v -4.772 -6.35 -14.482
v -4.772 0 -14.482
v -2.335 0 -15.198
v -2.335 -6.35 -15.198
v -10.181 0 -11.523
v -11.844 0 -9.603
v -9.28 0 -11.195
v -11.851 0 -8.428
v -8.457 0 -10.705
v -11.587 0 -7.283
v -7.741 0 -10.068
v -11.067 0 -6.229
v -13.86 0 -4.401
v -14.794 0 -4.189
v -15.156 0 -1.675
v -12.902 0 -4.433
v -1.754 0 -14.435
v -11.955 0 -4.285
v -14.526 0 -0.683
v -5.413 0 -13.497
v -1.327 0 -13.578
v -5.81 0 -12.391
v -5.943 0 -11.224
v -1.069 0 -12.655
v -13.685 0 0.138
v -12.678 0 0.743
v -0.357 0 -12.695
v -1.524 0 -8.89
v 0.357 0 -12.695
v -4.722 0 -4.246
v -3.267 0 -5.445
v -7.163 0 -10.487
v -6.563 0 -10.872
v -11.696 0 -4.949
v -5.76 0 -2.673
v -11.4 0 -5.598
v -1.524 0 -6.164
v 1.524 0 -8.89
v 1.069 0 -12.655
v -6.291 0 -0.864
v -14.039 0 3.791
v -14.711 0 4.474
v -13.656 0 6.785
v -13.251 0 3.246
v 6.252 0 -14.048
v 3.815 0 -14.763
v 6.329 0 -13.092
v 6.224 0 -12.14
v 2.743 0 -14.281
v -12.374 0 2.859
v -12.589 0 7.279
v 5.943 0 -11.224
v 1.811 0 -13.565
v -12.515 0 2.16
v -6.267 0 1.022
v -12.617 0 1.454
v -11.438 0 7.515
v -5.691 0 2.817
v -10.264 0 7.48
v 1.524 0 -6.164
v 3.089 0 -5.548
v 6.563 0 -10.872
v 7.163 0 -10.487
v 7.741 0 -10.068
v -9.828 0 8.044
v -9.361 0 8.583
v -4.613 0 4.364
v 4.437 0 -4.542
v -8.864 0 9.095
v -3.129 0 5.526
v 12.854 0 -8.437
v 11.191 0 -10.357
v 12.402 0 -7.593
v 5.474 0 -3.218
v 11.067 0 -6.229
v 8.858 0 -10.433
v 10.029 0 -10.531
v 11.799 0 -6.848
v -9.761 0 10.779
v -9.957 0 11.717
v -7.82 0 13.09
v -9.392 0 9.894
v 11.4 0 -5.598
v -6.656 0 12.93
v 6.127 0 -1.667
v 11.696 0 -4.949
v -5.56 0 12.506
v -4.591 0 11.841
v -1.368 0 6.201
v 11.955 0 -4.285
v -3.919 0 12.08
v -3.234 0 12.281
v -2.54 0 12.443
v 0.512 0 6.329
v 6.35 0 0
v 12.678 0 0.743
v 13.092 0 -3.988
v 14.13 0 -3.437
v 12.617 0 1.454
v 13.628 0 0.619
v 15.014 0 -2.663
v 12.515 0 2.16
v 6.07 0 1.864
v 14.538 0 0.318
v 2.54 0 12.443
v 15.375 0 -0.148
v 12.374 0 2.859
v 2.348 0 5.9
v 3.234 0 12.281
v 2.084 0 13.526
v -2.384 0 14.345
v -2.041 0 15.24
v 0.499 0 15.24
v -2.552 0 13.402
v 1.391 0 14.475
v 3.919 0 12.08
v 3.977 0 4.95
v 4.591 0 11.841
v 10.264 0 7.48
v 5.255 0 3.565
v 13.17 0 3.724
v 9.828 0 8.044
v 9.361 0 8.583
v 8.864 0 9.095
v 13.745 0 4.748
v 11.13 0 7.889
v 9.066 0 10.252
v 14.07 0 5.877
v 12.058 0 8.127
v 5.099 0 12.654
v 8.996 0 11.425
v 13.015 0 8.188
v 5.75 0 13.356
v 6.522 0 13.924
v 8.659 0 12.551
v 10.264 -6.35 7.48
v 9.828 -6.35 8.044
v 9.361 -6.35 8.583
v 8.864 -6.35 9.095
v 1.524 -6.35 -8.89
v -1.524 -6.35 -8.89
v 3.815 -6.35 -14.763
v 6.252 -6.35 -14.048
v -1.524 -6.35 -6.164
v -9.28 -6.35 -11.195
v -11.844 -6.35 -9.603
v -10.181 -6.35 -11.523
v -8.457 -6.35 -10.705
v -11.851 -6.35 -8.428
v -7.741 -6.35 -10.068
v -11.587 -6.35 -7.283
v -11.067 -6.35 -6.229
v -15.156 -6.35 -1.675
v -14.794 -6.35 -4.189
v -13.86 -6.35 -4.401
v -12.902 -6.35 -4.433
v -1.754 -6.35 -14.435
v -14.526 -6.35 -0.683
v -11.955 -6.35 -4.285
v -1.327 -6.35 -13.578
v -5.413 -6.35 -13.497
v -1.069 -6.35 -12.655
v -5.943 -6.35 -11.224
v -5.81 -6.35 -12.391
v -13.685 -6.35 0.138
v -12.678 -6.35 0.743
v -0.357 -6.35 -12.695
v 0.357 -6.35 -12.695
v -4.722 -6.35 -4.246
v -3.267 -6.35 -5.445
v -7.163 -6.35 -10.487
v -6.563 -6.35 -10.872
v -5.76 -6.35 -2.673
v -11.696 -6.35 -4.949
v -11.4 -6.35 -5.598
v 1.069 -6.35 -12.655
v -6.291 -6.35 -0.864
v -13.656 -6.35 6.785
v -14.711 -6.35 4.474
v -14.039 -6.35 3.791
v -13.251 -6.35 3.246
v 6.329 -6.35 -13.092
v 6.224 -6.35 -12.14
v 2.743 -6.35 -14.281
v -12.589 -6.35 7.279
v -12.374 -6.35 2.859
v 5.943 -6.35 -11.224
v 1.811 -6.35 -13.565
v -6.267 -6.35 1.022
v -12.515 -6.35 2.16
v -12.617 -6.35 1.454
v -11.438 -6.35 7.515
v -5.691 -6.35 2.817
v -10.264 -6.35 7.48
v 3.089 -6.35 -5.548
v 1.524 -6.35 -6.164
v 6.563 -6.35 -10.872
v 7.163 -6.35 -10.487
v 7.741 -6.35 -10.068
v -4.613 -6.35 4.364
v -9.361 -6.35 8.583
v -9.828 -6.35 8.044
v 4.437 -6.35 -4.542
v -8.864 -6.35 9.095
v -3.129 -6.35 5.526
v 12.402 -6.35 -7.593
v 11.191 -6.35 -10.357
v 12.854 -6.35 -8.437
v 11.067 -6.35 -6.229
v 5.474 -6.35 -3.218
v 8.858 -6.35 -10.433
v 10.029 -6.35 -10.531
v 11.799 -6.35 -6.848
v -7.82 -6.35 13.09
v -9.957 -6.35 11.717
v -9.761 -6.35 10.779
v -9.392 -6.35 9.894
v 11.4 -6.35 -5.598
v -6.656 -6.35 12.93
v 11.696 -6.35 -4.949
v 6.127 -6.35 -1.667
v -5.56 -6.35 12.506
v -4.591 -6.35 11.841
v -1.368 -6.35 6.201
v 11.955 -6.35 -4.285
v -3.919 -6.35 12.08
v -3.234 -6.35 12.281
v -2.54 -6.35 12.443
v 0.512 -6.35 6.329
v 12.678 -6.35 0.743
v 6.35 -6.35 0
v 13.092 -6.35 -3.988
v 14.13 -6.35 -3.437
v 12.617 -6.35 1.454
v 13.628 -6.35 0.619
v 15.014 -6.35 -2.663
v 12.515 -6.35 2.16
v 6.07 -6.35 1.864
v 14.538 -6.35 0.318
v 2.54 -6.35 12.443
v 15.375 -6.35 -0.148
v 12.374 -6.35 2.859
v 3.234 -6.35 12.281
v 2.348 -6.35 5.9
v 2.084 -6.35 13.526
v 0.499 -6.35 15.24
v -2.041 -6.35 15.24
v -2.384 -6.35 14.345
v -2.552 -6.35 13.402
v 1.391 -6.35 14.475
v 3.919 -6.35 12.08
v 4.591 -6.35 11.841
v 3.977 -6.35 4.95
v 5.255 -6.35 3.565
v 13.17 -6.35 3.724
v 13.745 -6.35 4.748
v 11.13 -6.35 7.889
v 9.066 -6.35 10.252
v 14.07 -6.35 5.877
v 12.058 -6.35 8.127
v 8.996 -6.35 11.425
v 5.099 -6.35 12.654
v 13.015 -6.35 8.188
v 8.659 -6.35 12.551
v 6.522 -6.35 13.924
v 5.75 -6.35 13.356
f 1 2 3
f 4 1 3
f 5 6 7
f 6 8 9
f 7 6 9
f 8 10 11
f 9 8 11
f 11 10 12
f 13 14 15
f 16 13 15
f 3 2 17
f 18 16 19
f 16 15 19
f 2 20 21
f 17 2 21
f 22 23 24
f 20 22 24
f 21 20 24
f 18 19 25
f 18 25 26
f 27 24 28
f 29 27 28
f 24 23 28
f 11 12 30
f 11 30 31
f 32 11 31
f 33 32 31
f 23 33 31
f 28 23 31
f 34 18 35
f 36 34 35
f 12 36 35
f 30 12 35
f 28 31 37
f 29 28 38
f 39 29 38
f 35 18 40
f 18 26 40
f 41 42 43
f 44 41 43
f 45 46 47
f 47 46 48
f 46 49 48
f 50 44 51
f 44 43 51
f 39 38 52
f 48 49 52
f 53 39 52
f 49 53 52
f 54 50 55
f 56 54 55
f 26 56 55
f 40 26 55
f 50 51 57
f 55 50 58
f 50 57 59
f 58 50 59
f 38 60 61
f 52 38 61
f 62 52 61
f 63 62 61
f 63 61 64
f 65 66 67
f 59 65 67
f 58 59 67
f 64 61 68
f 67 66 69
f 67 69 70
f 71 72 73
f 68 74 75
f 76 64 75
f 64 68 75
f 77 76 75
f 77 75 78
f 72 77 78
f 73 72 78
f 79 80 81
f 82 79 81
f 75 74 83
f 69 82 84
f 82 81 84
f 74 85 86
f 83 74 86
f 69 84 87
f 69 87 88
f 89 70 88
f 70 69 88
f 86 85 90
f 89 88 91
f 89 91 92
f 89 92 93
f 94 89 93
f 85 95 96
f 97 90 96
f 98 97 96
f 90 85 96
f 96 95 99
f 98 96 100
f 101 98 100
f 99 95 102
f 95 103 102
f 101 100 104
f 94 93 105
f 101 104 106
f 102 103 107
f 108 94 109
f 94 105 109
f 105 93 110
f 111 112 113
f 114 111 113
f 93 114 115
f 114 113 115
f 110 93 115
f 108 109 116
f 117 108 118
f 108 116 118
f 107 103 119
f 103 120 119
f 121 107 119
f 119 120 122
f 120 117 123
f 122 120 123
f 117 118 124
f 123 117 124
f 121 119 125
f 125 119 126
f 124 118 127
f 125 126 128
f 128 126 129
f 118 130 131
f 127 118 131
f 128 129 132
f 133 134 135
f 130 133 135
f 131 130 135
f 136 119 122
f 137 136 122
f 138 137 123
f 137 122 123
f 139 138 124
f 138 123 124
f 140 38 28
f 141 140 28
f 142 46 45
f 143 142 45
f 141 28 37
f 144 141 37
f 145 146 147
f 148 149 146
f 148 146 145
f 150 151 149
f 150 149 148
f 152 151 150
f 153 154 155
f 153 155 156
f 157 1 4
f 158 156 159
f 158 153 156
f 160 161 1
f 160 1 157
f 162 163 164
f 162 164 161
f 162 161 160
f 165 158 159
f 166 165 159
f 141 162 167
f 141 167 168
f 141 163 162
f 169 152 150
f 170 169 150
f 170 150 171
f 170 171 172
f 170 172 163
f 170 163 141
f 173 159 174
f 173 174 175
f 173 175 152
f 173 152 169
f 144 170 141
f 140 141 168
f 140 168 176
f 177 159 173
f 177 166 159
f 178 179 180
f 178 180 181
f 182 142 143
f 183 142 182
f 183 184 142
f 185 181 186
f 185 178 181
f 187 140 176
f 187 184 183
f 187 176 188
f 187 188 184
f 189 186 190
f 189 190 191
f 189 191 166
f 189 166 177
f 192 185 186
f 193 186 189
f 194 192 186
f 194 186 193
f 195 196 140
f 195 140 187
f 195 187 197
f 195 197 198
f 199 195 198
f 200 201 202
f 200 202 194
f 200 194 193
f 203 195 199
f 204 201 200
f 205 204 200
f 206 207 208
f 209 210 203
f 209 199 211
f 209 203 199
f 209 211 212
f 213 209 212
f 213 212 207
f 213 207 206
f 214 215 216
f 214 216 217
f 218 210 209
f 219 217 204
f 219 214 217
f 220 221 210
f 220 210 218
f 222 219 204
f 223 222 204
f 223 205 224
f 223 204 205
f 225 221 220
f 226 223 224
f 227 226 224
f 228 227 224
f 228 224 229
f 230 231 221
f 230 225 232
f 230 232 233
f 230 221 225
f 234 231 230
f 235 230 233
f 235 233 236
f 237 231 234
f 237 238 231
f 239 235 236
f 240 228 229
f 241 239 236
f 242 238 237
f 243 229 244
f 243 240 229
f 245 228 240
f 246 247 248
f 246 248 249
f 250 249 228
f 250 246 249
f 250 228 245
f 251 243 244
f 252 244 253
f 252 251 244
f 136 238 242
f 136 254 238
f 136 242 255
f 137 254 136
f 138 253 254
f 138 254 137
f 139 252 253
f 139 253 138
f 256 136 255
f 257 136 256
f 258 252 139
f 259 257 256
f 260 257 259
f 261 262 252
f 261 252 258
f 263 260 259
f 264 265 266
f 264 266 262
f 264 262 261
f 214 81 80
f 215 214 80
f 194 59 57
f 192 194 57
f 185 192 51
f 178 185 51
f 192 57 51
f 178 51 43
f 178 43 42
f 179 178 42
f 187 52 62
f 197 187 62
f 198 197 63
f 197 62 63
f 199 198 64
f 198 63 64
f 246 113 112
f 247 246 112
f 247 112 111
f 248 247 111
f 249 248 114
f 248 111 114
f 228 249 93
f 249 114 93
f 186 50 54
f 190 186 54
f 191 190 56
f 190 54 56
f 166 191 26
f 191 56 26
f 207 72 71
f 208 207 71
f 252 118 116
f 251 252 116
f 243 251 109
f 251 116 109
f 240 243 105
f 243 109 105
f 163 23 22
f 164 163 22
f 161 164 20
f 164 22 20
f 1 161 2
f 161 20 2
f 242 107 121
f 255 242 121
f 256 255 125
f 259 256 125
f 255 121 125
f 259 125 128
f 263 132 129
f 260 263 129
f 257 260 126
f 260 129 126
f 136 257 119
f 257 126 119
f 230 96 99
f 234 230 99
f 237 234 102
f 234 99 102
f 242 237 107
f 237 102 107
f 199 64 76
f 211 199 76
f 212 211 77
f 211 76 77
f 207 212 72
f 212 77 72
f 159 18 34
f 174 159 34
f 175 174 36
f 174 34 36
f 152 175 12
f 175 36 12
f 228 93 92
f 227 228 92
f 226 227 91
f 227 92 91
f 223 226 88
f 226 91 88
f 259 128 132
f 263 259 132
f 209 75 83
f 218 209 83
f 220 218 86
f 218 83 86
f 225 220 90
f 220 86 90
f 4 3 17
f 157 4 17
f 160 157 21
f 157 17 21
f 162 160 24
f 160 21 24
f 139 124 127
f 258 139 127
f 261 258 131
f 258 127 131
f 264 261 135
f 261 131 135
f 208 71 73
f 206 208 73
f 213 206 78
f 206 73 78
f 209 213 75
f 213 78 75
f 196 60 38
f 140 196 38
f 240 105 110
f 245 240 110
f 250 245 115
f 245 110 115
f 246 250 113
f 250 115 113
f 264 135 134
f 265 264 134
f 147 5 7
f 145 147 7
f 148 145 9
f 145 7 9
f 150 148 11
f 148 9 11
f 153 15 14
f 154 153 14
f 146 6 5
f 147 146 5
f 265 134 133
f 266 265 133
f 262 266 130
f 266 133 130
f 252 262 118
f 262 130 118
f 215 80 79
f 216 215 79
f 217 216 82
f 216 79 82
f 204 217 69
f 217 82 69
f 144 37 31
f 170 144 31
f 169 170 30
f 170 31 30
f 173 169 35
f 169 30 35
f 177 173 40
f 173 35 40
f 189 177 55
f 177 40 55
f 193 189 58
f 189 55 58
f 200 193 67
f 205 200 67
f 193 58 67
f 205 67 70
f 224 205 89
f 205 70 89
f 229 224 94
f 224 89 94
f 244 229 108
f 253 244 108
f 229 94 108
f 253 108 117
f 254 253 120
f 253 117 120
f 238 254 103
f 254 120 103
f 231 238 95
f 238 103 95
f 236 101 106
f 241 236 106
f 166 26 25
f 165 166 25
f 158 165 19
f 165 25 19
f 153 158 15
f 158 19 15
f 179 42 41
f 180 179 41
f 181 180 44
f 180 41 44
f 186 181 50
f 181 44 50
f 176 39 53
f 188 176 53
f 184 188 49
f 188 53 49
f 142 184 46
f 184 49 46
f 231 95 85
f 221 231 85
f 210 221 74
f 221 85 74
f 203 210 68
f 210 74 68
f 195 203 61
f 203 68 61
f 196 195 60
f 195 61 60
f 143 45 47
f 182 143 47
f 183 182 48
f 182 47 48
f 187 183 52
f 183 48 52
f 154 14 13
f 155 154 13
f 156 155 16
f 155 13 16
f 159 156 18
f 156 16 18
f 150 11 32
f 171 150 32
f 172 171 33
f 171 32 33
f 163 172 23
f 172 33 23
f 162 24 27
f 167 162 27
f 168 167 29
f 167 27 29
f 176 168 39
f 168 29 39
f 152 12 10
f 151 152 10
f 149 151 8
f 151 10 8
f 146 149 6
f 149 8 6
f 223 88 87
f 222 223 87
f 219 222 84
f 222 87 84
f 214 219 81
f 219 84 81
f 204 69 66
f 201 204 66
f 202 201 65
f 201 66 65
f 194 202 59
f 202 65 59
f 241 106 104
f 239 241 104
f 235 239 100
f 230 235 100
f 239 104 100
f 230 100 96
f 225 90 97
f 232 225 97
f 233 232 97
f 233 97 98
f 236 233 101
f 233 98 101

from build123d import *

# Parameters (mm, degrees)
F1_DEPTH = 6.35


with BuildPart() as f1:
    # F0 (on Front) → F1 (new body)
    with BuildSketch(Plane.XZ):
        with BuildLine():
            Line((0.498749, 15.24), (-2.041251, 15.24))
            ThreePointArc((-2.041251, 15.24), (-2.490083, 13.877276), (-2.54, 12.443408))
            ThreePointArc((-2.54, 12.443408), (-3.578003, 12.185561), (-4.59063, 11.841289))
            ThreePointArc((-4.59063, 11.841289), (-6.095514, 12.749414), (-7.819791, 13.090348))
            Line((-7.819791, 13.090348), (-9.956575, 11.71712))
            ThreePointArc((-9.956575, 11.71712), (-9.597413, 10.328067), (-8.864198, 9.094833))
            ThreePointArc((-8.864198, 9.094833), (-9.59802, 8.316731), (-10.263768, 7.479644))
            ThreePointArc((-10.263768, 7.479644), (-12.020726, 7.430005), (-13.655604, 6.784603))
            Line((-13.655604, 6.784603), (-14.710758, 4.474138))
            ThreePointArc((-14.710758, 4.474138), (-13.657632, 3.499769), (-12.374076, 2.858713))
            ThreePointArc((-12.374076, 2.858713), (-12.570732, 1.807398), (-12.678232, 0.743265))
            ThreePointArc((-12.678232, 0.743265), (-14.129443, -0.248377), (-15.155858, -1.675205))
            Line((-15.155858, -1.675205), (-14.794379, -4.189352))
            ThreePointArc((-14.794379, -4.189352), (-13.381649, -4.43968), (-11.955272, -4.285028))
            ThreePointArc((-11.955272, -4.285028), (-11.552326, -5.275771), (-11.067446, -6.229095))
            ThreePointArc((-11.067446, -6.229095), (-11.752161, -7.847902), (-11.844235, -9.603148))
            Line((-11.844235, -9.603148), (-10.180889, -11.522752))
            ThreePointArc((-10.180889, -11.522752), (-8.857087, -10.969562), (-7.740754, -10.068303))
            ThreePointArc((-7.740754, -10.068303), (-6.866138, -10.68392), (-5.942825, -11.223762))
            ThreePointArc((-5.942825, -11.223762), (-5.643651, -12.955773), (-4.772151, -14.482159))
            Line((-4.772151, -14.482159), (-2.335039, -15.19776))
            ThreePointArc((-2.335039, -15.19776), (-1.520463, -14.016686), (-1.068601, -12.654963))
            ThreePointArc((-1.068601, -12.654963), (0, -12.7), (1.068601, -12.654963))
            ThreePointArc((1.068601, -12.654963), (2.256678, -13.950278), (3.815058, -14.763187))
            Line((3.815058, -14.763187), (6.25217, -14.047586))
            ThreePointArc((6.25217, -14.047586), (6.298898, -12.613611), (5.942825, -11.223762))
            ThreePointArc((5.942825, -11.223762), (6.866138, -10.68392), (7.740754, -10.068303))
            ThreePointArc((7.740754, -10.068303), (9.440528, -10.515668), (11.191012, -10.357007))
            Line((11.191012, -10.357007), (12.854358, -8.437403))
            ThreePointArc((12.854358, -8.437403), (12.118403, -7.205804), (11.067446, -6.229095))
            ThreePointArc((11.067446, -6.229095), (11.552326, -5.275771), (11.955272, -4.285028))
            ThreePointArc((11.955272, -4.285028), (13.627077, -3.742408), (15.013899, -2.662551))
            Line((15.013899, -2.662551), (15.375379, -0.148405))
            ThreePointArc((15.375379, -0.148405), (14.090401, 0.489796), (12.678232, 0.743265))
            ThreePointArc((12.678232, 0.743265), (12.570732, 1.807398), (12.374076, 2.858713))
            ThreePointArc((12.374076, 2.858713), (13.487125, 4.21904), (14.06998, 5.877246))
            Line((14.06998, 5.877246), (13.014826, 8.187712))
            ThreePointArc((13.014826, 8.187712), (11.588796, 8.029888), (10.263768, 7.479644))
            ThreePointArc((10.263768, 7.479644), (9.59802, 8.316731), (8.864198, 9.094833))
            ThreePointArc((8.864198, 9.094833), (9.065106, 10.840973), (8.658941, 12.55106))
            Line((8.658941, 12.55106), (6.522157, 13.924287))
            ThreePointArc((6.522157, 13.924287), (5.40783, 13.020548), (4.59063, 11.841289))
            ThreePointArc((4.59063, 11.841289), (3.578003, 12.185561), (2.54, 12.443408))
            ThreePointArc((2.54, 12.443408), (1.76498, 14.020973), (0.498749, 15.24))
        make_face()
        with BuildLine():
            ThreePointArc((-1.524, -6.164408), (-3.914403, 4.999995), (6.35, 0))
            ThreePointArc((6.35, 0), (4.999995, -3.914403), (1.524, -6.164408))
            Line((1.524, -6.164408), (1.524, -8.89))
            Line((1.524, -8.89), (0, -8.89))
            Line((0, -8.89), (-1.524, -8.89))
            Line((-1.524, -8.89), (-1.524, -6.164408))
        make_face(mode=Mode.SUBTRACT)
    extrude(amount=F1_DEPTH)


solid = f1.part
